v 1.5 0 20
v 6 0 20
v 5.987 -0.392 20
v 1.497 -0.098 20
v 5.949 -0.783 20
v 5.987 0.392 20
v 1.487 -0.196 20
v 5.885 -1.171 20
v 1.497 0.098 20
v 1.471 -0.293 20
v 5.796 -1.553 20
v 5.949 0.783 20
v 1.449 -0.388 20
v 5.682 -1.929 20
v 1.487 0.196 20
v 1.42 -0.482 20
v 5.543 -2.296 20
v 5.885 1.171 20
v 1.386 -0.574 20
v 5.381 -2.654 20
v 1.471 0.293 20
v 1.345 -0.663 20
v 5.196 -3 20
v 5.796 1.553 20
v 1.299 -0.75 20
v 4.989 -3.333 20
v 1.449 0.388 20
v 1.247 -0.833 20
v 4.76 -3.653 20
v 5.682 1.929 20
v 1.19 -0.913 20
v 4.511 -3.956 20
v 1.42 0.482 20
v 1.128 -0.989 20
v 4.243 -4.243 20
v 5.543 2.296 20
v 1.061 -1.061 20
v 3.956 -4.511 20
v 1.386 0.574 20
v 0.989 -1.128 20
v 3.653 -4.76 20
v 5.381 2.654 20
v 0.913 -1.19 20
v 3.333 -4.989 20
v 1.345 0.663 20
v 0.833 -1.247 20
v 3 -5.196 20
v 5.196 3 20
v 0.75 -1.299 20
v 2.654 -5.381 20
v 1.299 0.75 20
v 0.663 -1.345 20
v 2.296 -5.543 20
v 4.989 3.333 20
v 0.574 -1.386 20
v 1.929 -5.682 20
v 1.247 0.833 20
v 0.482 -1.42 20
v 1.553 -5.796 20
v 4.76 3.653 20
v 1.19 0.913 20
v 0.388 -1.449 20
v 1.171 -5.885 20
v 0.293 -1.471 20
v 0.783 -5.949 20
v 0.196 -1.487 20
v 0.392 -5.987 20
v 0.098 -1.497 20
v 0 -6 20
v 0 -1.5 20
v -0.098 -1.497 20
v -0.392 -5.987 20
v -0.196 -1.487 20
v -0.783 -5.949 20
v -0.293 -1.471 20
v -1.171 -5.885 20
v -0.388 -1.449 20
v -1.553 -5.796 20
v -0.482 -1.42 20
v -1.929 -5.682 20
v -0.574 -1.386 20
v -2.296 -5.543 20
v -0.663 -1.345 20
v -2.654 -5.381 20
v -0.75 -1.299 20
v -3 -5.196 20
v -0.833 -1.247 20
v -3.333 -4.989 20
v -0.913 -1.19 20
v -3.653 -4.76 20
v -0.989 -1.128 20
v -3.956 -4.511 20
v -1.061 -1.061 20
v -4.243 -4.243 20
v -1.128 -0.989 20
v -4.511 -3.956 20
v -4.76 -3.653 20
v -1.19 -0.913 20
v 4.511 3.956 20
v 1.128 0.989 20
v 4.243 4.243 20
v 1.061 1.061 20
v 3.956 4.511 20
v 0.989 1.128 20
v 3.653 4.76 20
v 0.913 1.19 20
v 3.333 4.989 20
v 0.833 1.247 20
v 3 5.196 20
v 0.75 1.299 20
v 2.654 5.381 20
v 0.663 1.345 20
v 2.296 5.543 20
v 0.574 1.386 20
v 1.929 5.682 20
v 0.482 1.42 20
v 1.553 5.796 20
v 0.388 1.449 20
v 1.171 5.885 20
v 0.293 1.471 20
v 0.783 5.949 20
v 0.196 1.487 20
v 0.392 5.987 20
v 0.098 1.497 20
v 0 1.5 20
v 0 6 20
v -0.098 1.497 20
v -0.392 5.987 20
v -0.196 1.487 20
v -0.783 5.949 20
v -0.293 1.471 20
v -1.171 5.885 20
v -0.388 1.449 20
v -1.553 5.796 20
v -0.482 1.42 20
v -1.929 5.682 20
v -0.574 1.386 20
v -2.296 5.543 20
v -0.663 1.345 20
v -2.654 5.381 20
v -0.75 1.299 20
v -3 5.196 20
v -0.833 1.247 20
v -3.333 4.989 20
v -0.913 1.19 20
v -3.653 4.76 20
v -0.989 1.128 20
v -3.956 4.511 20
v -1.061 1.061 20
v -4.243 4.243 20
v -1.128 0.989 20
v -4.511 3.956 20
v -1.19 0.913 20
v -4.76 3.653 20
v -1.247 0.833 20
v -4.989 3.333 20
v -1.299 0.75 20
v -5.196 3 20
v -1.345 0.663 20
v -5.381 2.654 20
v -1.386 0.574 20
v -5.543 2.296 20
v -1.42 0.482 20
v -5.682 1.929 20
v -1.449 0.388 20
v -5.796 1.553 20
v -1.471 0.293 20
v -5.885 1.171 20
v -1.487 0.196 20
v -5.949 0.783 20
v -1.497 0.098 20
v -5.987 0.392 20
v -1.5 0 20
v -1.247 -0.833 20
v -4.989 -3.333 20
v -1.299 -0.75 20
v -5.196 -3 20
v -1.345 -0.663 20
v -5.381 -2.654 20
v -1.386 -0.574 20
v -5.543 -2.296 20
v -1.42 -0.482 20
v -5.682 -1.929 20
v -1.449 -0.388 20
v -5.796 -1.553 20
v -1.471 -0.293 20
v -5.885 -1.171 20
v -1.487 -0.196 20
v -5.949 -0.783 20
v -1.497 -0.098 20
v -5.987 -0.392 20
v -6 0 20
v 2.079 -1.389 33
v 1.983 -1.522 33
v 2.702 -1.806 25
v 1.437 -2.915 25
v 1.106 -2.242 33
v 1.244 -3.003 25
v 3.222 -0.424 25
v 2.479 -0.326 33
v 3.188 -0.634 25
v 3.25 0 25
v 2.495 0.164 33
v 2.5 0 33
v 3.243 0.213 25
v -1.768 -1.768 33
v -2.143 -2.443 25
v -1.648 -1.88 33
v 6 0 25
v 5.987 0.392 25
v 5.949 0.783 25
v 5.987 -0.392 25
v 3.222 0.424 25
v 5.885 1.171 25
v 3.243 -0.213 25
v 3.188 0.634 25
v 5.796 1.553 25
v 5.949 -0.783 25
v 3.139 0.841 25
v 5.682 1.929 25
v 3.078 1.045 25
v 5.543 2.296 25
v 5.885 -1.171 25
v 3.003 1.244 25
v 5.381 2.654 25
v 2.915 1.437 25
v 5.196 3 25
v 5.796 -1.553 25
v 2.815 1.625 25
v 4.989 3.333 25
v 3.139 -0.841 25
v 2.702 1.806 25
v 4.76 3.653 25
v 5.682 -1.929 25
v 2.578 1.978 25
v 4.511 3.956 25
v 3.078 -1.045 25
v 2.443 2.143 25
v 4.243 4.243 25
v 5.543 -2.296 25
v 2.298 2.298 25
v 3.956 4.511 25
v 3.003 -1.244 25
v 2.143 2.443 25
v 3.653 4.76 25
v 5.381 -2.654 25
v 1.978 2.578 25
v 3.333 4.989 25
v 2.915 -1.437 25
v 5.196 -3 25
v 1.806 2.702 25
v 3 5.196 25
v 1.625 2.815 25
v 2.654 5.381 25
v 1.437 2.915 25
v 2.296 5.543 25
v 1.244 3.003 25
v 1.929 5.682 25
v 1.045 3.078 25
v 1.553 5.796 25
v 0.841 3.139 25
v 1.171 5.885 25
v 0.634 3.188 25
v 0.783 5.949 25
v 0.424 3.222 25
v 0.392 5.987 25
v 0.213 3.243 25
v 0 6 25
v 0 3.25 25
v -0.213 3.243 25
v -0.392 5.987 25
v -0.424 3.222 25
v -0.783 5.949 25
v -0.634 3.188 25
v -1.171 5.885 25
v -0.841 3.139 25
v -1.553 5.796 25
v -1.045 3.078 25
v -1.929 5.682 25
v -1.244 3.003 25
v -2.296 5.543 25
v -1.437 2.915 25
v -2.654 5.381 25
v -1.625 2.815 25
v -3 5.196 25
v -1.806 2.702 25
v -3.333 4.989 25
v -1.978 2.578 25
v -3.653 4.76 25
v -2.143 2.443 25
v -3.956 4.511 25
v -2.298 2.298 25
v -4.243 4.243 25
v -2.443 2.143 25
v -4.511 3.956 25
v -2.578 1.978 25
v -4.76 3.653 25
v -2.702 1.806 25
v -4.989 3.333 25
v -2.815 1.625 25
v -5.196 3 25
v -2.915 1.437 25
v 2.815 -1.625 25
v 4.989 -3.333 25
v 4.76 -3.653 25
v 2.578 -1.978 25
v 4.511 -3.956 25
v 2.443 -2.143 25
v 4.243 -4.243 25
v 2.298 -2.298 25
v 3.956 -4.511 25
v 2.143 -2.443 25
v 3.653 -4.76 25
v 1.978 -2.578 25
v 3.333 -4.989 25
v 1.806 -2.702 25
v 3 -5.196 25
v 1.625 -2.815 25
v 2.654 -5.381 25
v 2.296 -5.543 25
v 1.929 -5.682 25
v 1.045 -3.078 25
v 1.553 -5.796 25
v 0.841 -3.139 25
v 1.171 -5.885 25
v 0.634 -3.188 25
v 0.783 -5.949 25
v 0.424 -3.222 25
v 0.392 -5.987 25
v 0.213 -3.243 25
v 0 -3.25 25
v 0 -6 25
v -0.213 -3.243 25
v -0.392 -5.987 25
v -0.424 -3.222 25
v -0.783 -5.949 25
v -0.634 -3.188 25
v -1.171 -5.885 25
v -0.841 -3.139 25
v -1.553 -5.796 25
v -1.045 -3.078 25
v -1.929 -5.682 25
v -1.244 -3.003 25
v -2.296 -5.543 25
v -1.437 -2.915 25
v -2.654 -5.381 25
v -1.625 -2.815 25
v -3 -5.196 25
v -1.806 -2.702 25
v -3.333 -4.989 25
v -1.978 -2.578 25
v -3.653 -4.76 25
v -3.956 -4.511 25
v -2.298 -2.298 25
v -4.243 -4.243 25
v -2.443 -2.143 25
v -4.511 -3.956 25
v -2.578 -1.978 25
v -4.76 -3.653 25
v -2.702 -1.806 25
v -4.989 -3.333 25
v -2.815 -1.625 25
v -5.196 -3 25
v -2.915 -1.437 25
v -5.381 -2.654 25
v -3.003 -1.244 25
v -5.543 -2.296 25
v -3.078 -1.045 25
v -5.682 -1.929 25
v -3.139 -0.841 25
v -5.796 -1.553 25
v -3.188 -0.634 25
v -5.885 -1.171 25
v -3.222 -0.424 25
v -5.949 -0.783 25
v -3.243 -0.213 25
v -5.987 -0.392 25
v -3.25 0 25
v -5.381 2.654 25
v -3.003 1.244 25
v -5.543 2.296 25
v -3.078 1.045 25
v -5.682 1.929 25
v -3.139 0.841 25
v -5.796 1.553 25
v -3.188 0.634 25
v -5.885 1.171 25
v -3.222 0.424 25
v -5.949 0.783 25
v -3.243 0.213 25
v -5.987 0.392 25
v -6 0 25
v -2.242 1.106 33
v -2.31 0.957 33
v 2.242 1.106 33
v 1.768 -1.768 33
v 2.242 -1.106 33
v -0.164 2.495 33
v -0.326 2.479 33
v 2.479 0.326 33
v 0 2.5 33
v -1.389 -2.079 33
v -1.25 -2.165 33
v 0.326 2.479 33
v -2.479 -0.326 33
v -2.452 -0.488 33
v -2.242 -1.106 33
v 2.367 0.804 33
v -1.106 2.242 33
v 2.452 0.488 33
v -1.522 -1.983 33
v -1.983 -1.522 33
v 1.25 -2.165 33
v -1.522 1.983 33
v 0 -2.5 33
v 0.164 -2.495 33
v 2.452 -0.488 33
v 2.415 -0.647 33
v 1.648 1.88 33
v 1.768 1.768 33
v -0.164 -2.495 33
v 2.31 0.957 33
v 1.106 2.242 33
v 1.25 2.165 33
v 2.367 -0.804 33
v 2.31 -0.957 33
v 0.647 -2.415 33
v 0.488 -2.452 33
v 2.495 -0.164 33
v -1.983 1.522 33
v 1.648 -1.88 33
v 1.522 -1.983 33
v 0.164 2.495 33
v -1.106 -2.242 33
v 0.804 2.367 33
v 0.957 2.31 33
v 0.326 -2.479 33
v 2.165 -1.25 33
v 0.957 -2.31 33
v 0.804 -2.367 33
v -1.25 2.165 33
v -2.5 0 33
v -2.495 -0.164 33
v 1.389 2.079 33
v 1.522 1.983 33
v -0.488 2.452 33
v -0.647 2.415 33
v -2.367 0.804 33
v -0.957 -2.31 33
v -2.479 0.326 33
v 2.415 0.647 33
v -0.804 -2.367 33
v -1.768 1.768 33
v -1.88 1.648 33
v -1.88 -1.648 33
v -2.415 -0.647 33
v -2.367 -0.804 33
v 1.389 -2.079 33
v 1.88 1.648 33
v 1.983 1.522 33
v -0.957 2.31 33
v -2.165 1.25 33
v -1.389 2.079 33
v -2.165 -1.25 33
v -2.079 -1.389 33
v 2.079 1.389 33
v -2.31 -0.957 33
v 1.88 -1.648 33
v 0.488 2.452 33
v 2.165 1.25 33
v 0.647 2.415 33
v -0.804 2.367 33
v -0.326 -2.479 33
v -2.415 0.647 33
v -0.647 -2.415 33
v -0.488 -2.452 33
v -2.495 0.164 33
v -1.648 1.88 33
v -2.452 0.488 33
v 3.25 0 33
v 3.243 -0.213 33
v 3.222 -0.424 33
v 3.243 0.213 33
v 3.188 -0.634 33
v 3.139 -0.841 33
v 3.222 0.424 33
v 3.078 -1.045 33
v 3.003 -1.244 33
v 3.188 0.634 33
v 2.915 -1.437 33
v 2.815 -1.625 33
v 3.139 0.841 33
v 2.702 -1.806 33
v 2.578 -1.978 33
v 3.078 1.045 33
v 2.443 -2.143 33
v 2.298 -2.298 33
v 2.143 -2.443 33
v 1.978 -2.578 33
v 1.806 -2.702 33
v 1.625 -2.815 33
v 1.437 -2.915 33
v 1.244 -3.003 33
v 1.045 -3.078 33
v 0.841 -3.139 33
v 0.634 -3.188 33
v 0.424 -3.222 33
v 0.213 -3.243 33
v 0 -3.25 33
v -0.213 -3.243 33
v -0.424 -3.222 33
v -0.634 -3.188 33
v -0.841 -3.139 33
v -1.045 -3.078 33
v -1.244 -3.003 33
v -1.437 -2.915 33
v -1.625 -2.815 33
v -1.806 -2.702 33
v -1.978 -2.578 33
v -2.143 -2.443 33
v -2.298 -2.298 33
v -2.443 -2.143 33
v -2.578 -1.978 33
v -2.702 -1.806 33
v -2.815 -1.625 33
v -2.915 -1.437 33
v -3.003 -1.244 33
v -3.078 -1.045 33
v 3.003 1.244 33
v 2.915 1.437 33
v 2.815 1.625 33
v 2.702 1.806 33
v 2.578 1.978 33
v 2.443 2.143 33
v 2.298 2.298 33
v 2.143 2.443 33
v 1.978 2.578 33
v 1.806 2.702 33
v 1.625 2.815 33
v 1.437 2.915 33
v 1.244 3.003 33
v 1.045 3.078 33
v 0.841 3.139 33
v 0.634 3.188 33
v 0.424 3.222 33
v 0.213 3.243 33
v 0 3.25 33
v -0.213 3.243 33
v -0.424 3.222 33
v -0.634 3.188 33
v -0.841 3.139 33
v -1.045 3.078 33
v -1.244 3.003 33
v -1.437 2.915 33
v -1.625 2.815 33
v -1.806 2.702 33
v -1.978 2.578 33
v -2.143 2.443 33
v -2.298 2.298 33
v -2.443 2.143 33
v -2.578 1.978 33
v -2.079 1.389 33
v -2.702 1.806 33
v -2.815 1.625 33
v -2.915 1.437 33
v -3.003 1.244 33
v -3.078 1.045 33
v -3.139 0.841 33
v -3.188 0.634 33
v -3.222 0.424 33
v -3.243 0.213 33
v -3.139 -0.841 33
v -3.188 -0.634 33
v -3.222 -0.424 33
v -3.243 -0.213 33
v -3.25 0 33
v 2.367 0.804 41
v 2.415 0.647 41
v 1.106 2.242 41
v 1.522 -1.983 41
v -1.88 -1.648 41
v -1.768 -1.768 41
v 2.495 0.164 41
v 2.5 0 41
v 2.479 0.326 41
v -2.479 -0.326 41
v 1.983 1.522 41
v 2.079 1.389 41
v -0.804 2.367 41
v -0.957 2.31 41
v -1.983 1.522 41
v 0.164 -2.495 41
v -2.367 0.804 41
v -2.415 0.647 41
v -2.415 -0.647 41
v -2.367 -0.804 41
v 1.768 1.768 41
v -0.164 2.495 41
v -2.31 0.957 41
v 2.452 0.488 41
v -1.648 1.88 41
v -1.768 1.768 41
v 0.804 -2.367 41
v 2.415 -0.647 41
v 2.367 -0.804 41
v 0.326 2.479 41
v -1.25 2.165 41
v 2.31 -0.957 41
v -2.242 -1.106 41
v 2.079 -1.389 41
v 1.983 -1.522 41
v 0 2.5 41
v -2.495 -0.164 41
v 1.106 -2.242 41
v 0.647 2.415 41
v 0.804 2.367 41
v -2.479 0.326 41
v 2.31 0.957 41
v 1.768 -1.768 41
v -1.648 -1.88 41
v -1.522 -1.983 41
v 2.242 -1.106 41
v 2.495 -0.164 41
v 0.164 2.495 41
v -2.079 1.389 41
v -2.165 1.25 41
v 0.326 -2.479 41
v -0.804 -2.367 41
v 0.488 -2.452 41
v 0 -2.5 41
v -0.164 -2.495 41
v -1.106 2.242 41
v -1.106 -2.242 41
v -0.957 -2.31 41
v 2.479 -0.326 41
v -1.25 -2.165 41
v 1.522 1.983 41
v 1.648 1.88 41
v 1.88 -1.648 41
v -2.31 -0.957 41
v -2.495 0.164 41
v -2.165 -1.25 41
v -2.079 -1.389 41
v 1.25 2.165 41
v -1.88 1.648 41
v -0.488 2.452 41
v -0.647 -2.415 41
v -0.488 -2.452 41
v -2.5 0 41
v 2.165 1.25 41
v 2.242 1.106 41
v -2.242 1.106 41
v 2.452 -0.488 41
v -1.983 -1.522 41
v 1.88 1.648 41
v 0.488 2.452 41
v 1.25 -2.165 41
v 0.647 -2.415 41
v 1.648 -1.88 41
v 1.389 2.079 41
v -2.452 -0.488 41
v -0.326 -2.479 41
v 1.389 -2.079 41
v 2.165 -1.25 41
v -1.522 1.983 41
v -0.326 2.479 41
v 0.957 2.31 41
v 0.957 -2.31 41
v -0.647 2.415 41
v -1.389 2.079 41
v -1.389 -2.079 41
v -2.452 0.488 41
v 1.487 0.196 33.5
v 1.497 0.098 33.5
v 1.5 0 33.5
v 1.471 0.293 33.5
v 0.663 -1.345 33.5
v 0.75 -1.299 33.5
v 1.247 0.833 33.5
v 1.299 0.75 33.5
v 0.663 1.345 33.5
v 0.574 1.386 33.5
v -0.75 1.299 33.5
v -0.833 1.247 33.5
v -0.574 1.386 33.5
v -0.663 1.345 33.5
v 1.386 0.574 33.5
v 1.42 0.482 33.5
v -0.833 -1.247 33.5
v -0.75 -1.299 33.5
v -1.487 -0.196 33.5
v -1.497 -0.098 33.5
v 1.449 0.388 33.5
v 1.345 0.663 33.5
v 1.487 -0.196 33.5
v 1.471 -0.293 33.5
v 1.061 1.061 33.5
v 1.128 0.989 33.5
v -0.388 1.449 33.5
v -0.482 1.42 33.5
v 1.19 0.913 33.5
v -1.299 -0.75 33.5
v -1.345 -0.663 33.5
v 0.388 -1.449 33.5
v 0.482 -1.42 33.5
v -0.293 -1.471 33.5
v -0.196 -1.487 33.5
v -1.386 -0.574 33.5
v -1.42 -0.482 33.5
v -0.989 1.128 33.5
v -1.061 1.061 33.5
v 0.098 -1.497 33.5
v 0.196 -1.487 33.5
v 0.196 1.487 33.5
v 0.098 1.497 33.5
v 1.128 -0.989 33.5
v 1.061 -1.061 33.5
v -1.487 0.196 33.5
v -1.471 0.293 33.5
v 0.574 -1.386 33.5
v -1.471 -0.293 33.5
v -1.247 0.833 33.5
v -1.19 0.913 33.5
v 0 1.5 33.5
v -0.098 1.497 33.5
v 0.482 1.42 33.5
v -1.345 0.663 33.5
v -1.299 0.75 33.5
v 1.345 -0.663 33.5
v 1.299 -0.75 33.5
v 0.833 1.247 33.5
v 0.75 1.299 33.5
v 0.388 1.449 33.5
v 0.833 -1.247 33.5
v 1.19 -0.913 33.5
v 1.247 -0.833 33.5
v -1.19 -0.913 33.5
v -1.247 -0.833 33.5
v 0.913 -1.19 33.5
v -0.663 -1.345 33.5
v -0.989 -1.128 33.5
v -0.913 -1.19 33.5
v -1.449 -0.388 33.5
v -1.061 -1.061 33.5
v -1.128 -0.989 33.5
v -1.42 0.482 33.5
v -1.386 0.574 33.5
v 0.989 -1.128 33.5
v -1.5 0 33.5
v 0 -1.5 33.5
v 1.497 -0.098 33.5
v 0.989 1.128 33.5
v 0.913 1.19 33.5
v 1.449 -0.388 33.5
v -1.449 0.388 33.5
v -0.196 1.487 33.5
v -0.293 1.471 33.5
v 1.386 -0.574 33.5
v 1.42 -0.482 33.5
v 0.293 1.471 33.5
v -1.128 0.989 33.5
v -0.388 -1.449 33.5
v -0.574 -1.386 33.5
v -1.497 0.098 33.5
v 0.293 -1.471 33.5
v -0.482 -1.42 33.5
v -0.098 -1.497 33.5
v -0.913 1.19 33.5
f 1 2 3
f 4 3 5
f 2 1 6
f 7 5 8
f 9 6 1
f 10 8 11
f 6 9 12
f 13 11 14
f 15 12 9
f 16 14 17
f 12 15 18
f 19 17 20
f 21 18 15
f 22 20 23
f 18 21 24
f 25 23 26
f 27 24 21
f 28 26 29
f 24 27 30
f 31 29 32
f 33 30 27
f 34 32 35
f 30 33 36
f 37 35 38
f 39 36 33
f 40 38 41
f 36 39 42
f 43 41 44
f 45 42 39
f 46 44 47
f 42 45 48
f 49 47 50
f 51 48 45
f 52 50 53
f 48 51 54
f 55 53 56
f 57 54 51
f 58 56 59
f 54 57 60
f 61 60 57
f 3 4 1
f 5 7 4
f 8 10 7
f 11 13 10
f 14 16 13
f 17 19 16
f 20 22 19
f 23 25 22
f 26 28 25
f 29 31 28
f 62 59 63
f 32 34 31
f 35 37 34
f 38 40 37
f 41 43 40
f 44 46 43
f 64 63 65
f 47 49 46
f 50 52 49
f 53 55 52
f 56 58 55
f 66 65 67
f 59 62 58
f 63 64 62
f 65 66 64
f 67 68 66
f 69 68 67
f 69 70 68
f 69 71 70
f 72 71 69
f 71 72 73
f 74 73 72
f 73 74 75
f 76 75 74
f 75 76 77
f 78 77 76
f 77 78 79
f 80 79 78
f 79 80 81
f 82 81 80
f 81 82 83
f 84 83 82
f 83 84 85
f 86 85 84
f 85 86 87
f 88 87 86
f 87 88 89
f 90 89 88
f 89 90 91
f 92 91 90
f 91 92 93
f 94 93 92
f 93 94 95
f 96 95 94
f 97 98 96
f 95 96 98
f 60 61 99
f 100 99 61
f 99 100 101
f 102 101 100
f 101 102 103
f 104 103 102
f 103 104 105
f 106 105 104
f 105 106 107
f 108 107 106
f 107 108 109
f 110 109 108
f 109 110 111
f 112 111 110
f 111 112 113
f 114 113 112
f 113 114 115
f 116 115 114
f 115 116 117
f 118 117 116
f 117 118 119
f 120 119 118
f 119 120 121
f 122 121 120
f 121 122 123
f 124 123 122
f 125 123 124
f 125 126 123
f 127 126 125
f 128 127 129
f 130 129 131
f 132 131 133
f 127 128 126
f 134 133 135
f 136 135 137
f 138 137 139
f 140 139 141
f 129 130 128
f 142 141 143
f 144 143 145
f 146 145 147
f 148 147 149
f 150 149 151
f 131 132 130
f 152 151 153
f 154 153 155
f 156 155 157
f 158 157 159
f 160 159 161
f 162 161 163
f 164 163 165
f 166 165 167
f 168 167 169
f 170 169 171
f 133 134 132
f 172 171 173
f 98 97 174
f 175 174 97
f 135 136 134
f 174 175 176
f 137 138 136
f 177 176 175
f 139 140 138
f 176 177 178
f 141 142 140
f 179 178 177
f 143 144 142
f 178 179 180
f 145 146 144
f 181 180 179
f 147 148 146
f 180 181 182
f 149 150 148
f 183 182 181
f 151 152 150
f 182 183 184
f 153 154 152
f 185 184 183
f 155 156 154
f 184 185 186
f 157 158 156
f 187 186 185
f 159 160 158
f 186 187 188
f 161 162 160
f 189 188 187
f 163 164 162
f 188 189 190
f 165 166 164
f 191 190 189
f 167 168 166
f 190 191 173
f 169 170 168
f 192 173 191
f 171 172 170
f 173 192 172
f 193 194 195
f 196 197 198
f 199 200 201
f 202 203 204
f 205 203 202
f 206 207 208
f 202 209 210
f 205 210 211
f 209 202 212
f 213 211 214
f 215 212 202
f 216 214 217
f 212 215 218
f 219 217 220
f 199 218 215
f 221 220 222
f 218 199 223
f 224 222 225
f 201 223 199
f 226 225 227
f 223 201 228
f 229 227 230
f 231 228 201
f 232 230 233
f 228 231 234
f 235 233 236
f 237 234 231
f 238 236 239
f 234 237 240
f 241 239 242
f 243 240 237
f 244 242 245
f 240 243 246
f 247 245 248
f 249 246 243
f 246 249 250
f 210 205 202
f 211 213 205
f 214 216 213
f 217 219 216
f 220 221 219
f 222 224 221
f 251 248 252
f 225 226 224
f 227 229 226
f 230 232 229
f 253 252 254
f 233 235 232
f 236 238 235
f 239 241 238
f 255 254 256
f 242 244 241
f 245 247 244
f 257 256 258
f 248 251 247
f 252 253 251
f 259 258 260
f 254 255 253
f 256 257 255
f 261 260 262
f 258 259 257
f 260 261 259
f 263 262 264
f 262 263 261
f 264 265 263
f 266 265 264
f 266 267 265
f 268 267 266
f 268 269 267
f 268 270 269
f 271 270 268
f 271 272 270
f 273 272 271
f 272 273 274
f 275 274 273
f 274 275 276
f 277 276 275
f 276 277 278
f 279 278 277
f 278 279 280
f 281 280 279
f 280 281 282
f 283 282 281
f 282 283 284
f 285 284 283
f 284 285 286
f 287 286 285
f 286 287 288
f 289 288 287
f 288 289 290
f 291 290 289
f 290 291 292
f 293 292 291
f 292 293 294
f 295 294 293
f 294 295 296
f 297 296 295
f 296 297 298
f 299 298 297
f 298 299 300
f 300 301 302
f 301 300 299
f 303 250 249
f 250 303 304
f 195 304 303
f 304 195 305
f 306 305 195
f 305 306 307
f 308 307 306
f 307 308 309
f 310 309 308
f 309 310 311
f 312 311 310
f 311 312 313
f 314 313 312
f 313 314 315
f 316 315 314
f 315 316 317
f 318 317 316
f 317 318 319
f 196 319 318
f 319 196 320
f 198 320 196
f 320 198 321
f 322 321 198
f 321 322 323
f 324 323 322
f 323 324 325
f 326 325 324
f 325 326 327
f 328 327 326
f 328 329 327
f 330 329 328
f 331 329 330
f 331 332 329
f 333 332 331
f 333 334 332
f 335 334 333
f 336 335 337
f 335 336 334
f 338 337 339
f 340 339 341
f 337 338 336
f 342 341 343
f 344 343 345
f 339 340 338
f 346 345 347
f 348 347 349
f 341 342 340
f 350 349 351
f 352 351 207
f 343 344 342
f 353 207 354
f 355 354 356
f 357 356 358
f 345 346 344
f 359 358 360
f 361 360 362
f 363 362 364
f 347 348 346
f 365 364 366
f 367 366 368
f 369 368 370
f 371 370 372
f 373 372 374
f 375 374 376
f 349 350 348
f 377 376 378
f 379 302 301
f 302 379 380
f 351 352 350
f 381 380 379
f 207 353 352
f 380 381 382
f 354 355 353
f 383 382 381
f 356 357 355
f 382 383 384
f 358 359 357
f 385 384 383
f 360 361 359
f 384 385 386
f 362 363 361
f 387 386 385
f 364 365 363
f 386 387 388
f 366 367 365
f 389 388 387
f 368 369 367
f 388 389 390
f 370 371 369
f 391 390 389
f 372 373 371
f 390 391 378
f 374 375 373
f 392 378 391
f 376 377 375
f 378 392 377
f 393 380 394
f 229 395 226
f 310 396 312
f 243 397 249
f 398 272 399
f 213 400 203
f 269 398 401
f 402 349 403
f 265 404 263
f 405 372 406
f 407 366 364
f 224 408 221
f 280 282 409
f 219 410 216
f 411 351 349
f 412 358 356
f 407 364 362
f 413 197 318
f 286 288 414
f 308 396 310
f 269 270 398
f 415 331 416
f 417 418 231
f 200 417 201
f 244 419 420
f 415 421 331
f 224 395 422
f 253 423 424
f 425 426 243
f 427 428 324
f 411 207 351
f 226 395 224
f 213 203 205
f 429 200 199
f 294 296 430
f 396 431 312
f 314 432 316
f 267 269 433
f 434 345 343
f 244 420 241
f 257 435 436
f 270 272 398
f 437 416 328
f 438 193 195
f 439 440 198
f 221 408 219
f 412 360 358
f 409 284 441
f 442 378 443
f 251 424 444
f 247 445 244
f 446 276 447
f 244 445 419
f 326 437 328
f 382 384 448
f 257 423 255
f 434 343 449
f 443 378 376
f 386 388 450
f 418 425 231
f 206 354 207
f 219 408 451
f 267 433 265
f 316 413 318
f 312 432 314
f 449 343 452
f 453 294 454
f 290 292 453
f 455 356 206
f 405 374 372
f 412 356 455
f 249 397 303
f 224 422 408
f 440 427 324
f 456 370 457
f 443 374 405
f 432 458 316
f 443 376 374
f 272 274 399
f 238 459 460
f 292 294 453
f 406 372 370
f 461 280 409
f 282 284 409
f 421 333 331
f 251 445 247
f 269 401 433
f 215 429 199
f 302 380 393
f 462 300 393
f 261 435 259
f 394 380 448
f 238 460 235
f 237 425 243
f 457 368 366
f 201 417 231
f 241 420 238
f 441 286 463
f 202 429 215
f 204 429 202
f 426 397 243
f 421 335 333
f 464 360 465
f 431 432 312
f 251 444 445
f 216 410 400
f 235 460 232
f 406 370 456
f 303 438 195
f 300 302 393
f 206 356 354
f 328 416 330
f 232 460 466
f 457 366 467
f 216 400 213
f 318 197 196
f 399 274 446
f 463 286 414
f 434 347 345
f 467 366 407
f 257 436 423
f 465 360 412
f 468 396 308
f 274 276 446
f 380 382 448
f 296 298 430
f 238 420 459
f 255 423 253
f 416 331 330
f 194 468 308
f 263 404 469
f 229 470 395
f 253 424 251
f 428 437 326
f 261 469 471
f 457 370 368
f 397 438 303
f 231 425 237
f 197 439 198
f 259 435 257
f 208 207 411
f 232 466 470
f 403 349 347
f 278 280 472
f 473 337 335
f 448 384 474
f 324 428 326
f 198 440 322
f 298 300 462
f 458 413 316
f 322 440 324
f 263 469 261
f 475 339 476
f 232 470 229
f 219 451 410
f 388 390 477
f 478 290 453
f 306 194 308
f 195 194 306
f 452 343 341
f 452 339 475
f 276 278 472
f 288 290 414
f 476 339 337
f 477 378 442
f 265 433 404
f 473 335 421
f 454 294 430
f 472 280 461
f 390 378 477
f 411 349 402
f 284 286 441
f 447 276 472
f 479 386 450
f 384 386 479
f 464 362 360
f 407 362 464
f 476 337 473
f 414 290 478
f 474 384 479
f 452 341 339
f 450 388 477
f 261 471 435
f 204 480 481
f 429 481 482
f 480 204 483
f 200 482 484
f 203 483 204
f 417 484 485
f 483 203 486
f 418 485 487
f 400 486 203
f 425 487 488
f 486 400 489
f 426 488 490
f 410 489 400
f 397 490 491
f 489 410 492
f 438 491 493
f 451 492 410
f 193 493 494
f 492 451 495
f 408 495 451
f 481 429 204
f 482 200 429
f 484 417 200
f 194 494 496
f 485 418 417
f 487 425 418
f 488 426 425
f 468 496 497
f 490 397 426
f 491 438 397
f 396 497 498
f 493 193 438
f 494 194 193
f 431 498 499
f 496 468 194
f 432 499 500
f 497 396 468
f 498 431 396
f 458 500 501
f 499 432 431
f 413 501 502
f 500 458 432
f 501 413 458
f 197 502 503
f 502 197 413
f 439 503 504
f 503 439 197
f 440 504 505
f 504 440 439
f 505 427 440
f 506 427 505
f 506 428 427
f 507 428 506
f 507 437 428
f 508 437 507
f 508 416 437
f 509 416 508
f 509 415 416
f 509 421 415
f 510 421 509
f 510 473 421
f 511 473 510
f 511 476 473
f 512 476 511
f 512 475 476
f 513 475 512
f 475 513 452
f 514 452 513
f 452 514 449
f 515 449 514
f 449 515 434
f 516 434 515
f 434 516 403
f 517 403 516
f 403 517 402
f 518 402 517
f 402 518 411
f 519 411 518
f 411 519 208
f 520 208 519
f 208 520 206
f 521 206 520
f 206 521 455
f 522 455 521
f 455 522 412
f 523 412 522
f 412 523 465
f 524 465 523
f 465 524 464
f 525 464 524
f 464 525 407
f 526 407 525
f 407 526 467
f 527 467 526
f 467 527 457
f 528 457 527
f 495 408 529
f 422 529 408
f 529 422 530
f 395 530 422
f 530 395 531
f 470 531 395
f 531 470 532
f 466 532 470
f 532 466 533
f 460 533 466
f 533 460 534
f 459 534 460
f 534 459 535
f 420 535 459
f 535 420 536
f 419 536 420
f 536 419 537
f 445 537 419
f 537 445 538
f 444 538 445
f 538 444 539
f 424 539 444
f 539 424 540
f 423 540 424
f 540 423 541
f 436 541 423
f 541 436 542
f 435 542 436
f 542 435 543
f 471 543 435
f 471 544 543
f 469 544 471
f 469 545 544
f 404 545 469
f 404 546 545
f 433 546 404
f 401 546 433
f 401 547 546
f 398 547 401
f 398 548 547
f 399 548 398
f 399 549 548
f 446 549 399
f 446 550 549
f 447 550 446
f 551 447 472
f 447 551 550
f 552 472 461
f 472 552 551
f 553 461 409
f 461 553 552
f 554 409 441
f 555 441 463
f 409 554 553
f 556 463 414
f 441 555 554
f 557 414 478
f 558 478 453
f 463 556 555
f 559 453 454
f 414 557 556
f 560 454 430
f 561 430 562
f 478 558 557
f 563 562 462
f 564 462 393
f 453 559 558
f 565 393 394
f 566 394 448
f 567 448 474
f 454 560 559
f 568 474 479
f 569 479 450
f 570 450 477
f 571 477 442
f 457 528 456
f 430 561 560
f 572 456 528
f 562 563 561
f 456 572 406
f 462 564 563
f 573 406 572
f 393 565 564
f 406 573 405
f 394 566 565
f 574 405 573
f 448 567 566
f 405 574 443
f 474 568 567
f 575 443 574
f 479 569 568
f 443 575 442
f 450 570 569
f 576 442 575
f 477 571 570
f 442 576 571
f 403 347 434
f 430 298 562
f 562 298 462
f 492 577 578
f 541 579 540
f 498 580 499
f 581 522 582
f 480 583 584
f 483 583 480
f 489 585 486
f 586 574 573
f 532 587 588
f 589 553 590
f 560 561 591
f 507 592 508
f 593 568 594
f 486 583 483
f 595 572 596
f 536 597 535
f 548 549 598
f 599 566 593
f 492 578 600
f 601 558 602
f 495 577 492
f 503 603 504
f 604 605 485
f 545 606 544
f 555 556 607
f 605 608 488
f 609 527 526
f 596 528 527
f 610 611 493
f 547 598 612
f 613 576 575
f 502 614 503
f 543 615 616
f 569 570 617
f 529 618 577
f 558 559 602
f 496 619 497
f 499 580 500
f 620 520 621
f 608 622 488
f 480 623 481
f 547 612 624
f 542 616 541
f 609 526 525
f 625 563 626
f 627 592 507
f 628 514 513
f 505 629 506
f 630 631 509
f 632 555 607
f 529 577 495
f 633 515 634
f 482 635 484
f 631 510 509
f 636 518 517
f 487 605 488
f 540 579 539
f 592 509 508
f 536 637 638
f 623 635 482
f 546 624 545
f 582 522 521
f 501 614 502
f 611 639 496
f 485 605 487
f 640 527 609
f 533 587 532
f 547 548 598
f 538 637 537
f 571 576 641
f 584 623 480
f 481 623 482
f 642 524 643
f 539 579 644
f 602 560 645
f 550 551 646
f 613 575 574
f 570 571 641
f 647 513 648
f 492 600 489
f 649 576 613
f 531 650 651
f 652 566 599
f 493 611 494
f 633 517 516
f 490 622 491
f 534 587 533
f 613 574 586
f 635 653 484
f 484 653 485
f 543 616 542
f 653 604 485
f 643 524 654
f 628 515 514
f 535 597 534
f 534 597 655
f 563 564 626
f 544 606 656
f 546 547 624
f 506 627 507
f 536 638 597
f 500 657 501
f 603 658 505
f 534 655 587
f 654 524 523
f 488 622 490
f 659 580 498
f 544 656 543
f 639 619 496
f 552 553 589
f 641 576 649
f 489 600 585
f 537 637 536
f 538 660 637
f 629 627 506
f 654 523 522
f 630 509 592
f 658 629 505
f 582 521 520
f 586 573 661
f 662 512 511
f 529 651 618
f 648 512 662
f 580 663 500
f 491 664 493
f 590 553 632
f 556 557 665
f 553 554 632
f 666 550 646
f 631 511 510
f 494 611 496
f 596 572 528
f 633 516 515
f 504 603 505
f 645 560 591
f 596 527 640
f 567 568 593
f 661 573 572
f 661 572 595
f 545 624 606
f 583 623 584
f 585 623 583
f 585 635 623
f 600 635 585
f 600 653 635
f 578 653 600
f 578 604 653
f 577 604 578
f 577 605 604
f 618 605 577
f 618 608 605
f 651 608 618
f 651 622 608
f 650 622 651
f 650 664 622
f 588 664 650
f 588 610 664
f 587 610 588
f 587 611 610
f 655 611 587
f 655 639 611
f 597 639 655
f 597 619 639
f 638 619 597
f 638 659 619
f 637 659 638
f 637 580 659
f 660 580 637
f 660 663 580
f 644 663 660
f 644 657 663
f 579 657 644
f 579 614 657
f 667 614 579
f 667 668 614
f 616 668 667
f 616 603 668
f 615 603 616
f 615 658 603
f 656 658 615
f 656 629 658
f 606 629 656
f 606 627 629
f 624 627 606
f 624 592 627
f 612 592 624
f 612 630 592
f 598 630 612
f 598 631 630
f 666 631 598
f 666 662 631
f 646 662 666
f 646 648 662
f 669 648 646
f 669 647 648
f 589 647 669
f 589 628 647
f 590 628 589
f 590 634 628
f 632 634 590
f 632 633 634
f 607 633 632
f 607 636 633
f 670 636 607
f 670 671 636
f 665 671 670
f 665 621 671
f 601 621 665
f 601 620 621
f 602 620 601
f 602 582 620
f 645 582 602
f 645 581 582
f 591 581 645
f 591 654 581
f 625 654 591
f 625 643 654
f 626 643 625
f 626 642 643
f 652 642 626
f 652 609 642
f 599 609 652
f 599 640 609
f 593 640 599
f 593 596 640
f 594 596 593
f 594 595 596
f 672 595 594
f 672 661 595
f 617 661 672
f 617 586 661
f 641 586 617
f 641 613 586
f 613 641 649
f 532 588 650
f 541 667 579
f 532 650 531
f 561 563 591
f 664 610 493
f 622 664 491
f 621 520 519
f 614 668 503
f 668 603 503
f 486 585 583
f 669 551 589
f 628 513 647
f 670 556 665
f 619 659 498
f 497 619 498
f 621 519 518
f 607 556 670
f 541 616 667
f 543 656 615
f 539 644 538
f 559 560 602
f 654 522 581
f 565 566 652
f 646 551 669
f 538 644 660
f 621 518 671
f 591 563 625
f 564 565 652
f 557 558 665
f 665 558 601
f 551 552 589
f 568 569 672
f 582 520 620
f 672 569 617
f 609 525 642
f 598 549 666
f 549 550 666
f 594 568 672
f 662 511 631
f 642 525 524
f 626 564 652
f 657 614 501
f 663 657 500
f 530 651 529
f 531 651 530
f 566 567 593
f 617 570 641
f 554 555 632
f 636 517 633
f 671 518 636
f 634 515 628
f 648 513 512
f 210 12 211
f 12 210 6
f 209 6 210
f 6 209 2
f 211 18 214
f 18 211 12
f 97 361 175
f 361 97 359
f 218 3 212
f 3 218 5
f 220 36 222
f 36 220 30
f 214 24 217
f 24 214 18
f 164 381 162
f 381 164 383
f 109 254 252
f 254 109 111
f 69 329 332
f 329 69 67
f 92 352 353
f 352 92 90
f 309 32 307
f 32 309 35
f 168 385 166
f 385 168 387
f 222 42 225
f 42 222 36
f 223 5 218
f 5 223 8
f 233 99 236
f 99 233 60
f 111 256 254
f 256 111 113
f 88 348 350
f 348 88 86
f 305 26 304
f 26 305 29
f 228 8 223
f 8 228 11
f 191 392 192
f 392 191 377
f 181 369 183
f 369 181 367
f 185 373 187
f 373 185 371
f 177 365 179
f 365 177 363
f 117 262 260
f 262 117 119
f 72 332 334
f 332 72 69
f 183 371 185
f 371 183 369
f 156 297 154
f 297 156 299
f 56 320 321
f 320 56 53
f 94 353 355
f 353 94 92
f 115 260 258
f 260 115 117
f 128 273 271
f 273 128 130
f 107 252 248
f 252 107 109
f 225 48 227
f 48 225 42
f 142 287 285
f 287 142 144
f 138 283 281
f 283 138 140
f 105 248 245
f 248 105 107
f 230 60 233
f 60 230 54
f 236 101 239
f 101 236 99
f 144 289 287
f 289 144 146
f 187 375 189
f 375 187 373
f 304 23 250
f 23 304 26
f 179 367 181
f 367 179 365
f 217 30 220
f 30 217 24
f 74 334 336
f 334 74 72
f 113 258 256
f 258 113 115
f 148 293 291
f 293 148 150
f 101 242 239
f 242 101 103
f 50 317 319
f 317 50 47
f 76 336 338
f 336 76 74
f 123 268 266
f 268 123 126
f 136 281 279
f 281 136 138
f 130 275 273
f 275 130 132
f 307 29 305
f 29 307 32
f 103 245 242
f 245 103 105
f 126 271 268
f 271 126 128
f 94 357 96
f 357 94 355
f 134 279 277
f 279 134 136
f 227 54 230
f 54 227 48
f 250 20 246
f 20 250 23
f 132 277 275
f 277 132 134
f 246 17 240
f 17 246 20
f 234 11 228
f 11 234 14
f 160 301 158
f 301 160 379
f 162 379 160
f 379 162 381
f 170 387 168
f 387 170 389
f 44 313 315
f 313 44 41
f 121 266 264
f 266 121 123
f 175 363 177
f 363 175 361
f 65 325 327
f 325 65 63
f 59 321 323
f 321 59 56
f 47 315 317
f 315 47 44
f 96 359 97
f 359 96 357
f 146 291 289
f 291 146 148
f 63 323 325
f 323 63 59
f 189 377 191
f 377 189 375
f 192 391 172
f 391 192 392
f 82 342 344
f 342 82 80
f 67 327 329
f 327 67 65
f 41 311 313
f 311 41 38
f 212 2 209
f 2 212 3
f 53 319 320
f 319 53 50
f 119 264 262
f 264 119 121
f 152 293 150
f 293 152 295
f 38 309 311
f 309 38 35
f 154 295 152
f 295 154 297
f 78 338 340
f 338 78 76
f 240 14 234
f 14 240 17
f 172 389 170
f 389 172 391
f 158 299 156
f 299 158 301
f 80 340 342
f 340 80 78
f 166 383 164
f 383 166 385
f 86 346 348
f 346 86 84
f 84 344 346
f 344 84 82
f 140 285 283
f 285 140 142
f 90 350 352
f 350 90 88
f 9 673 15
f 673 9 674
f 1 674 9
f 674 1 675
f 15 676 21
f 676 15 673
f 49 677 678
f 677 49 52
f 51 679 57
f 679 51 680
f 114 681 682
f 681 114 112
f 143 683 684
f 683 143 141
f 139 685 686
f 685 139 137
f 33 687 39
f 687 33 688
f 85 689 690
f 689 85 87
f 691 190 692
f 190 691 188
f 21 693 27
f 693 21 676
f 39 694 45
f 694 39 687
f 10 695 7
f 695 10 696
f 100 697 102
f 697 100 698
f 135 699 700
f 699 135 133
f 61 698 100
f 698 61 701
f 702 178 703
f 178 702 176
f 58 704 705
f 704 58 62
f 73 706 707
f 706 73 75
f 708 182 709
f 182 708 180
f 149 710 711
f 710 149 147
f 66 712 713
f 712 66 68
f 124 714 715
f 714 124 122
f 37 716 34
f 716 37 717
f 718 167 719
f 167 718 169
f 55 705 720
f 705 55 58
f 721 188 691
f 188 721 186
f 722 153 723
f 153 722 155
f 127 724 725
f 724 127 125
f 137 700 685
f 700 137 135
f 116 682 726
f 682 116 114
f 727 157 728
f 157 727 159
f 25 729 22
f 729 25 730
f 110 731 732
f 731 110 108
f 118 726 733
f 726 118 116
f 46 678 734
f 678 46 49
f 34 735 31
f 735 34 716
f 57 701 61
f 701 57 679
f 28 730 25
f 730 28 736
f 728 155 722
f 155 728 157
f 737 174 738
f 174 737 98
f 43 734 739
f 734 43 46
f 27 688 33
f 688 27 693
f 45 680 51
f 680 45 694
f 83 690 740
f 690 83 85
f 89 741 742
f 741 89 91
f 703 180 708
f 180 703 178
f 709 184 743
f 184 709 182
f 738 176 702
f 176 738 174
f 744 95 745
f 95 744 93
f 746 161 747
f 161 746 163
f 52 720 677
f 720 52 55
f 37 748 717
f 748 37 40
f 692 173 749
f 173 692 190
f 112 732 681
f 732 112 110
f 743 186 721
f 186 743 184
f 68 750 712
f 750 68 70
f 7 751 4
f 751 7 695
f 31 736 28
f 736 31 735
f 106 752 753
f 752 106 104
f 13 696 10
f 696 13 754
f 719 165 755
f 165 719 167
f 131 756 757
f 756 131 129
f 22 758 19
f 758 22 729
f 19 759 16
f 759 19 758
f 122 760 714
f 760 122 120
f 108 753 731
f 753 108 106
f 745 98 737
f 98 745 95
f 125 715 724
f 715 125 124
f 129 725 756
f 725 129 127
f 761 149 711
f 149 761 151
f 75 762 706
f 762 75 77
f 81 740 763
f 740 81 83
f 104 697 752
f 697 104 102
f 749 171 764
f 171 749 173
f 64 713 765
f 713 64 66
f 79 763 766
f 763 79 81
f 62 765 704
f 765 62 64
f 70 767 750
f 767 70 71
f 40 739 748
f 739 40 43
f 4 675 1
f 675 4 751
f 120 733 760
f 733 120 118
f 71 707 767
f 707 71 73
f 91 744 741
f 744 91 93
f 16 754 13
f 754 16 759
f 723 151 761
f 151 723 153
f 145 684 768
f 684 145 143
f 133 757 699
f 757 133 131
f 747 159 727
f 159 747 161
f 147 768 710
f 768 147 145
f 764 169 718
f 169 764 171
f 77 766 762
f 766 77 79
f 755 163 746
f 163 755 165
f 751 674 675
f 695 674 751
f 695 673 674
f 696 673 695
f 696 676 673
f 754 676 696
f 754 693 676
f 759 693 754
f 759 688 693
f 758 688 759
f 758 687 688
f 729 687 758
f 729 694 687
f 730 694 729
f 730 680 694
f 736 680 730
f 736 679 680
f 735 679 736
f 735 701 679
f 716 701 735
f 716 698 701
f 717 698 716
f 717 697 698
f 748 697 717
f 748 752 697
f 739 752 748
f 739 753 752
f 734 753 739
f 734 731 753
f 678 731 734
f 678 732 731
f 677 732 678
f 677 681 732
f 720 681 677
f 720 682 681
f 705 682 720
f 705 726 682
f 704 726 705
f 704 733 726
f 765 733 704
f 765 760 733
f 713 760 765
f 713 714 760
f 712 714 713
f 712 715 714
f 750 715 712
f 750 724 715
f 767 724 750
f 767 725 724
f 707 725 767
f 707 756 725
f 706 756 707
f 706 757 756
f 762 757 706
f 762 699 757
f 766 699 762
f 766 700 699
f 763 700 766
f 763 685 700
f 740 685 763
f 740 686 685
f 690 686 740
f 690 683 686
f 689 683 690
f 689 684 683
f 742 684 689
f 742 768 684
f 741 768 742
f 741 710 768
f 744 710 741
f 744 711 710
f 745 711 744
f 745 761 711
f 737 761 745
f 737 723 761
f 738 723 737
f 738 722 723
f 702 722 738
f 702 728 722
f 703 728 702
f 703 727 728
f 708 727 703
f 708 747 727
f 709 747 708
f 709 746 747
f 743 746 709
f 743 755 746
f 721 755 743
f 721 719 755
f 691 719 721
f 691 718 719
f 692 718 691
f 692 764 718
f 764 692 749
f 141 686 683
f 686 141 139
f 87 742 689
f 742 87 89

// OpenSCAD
// Hose-barb reducer: 8 mm ID -> 5 mm ID
// Print orientation: standing upright along +Z

// ---- Parameters ----
eps      = 0.5;   // overcut for clean differences
$fn      = 96;    // smoothness of curved surfaces

tube_d1  = 8;     // inner diameter of large tubing
tube_d2  = 5;     // inner diameter of small tubing
bore     = 3;     // through-bore diameter

base_h   = 20;    // height of first (8 mm) barb section
collar_d = 12;    // diameter of joining collar
collar_h = 5;     // height of collar

top_h    = 8;     // height of second (5 mm) barb section
total_l  = base_h + collar_h + top_h;  // 41 mm overall length

// ---- Derived ----
r_bore = bore / 2;
// keep the sawtooth teeth tall enough to grip the tubing
teeth_h = max(1, tube_d1 / 2 - 1.5);

// ---- Profile (radius vs height), counter-clockwise ----
profile = [
    [r_bore, 0],
    [collar_d / 2, base_h],
    [collar_d / 2, base_h + collar_h],
    [r_bore, total_l]
];

// ---- Model ----
difference() {
    union() {
        // 8 mm tubing barbs: sawtooth outer profile
        for (z = [0, base_h])
            translate([0, 0, z])
                linear_extrude(height = teeth_h)
                    circle(r = [7.5, 9.5]);   // linear growth 7.5 -> 9.5

        // collar
        translate([0, 0, base_h])
            cylinder(h = collar_h, d = collar_d);

        // 5 mm tubing barbs: tapered outer profile
        for (z = [base_h + collar_h, total_l])
            translate([0, 0, z])
                cylinder(h = 8, d1 = 6.5, d2 = 5);   // linear shrink 6.5 -> 5.0
    }

    // through-bore
    translate([0, 0, -eps])
        cylinder(h = total_l + 2 * eps, d = bore);
}
